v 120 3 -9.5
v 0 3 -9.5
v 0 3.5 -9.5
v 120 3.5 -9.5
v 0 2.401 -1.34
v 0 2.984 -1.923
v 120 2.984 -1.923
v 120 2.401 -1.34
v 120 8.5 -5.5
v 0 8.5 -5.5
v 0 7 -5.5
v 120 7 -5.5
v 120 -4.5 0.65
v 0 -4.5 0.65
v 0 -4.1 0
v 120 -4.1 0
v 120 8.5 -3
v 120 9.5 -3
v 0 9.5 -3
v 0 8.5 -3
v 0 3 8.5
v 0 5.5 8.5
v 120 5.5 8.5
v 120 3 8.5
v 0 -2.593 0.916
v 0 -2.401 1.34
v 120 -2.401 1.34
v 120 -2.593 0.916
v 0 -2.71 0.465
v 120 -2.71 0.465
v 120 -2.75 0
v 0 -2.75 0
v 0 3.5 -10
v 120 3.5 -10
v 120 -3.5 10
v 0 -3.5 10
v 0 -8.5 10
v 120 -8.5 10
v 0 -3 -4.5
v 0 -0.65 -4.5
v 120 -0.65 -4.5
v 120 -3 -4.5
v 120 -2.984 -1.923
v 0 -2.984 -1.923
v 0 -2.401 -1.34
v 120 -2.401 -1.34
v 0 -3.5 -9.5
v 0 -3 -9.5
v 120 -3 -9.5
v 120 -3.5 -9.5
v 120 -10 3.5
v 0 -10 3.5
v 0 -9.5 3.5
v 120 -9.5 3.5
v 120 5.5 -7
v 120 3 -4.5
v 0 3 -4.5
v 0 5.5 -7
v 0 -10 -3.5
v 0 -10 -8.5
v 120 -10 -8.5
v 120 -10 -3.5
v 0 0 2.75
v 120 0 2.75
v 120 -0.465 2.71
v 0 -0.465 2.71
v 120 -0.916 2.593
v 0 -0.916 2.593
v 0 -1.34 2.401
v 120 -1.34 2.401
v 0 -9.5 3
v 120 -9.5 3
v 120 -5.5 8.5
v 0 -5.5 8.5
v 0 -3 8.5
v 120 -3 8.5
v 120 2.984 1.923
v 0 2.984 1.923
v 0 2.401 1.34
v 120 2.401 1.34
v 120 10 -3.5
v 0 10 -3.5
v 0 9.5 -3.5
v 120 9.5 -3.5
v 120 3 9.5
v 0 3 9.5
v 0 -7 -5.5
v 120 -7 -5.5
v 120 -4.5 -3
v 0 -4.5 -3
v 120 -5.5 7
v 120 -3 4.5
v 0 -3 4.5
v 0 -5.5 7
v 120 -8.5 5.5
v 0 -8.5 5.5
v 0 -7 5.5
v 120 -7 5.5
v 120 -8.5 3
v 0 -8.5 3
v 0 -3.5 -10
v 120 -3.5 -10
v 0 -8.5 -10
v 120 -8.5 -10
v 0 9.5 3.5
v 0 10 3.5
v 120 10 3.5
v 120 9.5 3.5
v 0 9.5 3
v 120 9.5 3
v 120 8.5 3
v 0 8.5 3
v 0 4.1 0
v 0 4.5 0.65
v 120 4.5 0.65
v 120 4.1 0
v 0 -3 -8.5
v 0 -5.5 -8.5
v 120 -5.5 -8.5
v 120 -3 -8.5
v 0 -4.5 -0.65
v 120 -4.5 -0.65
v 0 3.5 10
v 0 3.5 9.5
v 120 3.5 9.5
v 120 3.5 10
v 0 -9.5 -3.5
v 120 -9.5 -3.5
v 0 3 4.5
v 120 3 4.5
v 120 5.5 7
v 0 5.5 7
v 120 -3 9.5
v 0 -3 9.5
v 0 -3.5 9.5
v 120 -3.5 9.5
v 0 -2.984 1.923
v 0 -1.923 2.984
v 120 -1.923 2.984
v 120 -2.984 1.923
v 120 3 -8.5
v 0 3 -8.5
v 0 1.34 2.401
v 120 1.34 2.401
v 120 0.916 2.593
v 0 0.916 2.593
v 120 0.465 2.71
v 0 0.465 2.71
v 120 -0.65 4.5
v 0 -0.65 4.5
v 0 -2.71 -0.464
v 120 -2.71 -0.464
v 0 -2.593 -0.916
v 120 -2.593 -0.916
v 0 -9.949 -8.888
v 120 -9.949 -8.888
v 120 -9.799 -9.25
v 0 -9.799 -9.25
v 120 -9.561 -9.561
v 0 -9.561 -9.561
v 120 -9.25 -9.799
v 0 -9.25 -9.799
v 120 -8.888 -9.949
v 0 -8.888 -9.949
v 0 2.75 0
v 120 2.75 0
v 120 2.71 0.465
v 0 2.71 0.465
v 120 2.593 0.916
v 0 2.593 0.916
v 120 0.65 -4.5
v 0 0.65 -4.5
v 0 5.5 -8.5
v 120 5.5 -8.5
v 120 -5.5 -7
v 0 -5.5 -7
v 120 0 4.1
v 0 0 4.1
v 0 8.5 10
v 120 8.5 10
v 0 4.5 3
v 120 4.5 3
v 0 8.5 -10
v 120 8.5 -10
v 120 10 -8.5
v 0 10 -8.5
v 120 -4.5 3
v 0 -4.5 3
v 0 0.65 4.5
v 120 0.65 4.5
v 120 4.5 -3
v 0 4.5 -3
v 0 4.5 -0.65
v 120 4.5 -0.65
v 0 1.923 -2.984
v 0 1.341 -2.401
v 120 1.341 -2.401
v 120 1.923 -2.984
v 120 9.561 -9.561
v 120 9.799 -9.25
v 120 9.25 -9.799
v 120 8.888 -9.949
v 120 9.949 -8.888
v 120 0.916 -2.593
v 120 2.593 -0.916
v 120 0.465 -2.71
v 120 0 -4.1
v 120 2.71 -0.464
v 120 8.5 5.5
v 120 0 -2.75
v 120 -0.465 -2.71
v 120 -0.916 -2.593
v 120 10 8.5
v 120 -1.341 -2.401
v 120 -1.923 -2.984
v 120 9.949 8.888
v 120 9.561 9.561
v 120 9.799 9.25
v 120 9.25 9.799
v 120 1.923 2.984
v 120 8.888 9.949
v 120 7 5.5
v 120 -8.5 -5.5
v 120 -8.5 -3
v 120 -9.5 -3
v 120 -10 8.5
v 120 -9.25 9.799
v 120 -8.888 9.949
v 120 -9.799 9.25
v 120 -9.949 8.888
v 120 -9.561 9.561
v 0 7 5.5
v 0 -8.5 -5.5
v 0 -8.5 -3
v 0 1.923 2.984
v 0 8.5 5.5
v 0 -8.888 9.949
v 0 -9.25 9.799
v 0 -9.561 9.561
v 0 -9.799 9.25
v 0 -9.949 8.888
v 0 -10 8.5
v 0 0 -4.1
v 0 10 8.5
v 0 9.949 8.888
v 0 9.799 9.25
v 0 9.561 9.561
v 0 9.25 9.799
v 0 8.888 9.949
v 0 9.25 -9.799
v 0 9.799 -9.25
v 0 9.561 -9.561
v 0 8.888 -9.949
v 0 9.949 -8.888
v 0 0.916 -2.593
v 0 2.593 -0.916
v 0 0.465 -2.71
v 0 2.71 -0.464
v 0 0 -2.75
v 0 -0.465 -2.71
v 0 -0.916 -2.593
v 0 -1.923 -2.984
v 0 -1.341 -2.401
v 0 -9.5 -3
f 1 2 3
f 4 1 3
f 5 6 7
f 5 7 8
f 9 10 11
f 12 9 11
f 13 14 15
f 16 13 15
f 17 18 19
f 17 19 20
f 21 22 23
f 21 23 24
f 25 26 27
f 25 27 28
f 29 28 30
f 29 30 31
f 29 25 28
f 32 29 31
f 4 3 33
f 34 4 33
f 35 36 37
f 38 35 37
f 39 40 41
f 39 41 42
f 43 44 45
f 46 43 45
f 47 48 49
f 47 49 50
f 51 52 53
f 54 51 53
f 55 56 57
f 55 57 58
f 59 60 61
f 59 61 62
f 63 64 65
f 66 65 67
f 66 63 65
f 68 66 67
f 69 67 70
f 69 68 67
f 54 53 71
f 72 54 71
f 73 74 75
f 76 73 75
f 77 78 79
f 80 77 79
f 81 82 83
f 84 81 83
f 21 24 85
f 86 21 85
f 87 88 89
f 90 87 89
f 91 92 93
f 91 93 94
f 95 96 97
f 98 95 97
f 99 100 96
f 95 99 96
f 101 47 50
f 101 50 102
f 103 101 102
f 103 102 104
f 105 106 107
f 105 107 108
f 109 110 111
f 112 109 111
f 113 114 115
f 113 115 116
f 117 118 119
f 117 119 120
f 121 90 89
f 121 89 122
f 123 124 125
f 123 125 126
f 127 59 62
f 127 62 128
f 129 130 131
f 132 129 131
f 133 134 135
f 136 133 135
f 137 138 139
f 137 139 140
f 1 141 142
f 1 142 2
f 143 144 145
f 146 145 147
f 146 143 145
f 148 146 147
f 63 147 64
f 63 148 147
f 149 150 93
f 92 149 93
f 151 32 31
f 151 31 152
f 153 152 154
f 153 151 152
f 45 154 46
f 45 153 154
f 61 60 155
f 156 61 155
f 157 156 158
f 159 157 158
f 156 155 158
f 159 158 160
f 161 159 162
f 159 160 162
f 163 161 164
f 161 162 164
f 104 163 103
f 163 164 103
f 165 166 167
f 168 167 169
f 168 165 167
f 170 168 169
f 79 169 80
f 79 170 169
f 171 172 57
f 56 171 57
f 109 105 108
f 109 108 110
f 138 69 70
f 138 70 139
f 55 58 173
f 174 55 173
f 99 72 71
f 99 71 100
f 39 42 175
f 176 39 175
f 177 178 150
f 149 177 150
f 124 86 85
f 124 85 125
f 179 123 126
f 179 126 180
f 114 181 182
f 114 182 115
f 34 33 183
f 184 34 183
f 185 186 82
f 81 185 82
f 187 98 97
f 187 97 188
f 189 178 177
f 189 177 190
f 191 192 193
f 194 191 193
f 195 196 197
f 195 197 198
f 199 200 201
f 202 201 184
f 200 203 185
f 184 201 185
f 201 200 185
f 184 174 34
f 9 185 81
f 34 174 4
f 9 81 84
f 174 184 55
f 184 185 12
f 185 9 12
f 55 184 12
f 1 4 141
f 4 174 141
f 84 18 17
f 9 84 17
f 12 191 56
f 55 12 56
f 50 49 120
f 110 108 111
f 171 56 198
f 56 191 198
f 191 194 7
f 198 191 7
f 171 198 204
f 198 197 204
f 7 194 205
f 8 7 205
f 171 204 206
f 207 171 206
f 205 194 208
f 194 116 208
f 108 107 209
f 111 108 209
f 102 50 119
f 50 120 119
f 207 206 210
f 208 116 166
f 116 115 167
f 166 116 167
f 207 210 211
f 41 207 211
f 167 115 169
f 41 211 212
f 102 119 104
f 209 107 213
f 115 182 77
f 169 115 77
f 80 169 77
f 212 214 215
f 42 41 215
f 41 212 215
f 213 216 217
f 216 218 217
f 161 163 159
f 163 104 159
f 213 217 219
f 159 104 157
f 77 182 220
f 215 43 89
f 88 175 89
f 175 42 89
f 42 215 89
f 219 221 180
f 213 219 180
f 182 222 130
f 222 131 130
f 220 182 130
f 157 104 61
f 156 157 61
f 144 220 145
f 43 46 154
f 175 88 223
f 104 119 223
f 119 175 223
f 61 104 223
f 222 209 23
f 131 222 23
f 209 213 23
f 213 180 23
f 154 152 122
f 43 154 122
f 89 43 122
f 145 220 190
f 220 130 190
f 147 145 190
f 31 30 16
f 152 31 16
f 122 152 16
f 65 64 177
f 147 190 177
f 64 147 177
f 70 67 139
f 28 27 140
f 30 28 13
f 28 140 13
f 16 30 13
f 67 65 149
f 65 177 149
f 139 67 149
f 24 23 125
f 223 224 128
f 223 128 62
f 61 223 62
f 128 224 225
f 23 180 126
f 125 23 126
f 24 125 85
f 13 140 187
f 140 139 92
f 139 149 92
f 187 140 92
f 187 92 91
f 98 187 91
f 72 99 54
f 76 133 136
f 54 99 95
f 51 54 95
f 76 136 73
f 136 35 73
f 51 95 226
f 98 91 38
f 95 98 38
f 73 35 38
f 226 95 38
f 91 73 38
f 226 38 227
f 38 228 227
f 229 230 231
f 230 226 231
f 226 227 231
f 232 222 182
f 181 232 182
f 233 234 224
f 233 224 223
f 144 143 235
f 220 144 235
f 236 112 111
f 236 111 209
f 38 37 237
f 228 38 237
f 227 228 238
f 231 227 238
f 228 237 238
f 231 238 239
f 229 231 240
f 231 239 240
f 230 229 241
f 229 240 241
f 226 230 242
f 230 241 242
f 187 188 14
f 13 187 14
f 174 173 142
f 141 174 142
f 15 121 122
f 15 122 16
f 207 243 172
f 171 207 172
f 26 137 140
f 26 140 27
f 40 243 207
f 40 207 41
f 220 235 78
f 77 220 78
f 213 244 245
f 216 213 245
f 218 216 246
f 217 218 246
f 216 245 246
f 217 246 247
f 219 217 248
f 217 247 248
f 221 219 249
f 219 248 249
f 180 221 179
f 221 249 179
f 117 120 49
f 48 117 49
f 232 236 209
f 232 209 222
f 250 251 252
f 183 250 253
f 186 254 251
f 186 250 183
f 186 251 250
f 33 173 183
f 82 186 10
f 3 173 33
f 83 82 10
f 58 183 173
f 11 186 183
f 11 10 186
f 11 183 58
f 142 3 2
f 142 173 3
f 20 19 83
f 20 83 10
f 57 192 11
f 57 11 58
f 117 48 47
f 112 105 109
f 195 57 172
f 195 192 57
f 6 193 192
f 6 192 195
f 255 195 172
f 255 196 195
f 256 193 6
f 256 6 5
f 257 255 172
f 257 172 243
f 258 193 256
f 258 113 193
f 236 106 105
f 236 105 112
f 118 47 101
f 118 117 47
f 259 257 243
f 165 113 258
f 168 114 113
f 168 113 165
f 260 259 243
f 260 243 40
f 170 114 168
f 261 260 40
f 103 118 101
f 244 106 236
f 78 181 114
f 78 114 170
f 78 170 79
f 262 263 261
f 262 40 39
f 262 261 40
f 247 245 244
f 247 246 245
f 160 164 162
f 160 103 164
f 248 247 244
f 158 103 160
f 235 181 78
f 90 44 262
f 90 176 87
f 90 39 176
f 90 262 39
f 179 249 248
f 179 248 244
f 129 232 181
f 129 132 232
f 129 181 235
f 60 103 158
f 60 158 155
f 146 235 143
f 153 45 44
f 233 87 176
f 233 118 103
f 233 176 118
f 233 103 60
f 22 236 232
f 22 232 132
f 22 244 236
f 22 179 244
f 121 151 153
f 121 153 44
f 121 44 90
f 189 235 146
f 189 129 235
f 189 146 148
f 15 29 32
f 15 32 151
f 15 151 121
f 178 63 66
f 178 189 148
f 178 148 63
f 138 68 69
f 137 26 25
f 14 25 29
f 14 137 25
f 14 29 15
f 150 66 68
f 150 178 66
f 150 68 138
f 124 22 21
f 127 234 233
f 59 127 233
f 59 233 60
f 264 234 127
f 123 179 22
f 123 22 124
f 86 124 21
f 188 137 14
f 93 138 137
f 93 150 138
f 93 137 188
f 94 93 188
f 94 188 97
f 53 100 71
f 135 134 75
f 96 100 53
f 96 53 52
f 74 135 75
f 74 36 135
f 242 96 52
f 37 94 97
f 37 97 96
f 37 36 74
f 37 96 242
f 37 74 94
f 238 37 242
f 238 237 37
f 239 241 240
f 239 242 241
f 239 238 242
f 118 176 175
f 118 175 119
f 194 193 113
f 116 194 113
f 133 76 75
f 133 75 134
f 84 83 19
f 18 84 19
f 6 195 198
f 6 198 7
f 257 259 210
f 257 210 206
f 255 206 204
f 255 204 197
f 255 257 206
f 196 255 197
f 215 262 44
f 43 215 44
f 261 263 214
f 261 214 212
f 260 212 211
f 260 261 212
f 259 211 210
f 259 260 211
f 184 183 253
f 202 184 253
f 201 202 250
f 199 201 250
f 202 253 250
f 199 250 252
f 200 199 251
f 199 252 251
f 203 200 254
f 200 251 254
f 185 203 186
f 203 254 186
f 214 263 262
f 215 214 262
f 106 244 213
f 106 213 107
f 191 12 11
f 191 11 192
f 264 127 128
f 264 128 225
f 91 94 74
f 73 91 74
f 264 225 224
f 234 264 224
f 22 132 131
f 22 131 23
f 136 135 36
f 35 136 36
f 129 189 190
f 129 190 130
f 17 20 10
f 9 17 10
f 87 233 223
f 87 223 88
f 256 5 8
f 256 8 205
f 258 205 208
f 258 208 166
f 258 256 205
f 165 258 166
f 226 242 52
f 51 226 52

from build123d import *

# Parameters (mm, degrees)
PAD_DEPTH = 120


with BuildPart() as part:
    # Sketch → Pad (new body)
    with BuildSketch(Plane.YZ):
        with BuildLine():
            Line((0, 4.1), (0.65, 4.5))
            Line((0.65, 4.5), (3, 4.5))
            Line((3, 4.5), (5.5, 7))
            Line((5.5, 7), (5.5, 8.5))
            Line((5.5, 8.5), (3, 8.5))
            Line((3, 8.5), (3, 9.5))
            Line((3, 9.5), (3.5, 9.5))
            Line((3.5, 9.5), (3.5, 10))
            Line((3.5, 10), (8.5, 10))
            ThreePointArc((10, 8.5), (9.56066, 9.56066), (8.5, 10))
            Line((10, 8.5), (10, 3.5))
            Line((10, 3.5), (9.5, 3.5))
            Line((9.5, 3.5), (9.5, 3))
            Line((9.5, 3), (8.5, 3))
            Line((8.5, 3), (8.5, 5.5))
            Line((8.5, 5.5), (7, 5.5))
            Line((7, 5.5), (4.5, 3))
            Line((4.5, 3), (4.5, 0.65))
            Line((4.5, 0.65), (4.1, 0))
            Line((4.5, -0.65), (4.1, 0))
            Line((4.5, -3), (4.5, -0.65))
            Line((7, -5.5), (4.5, -3))
            Line((8.5, -5.5), (7, -5.5))
            Line((8.5, -3), (8.5, -5.5))
            Line((9.5, -3), (8.5, -3))
            Line((9.5, -3.5), (9.5, -3))
            Line((10, -3.5), (9.5, -3.5))
            Line((10, -8.5), (10, -3.5))
            ThreePointArc((8.5, -10), (9.56066, -9.56066), (10, -8.5))
            Line((3.5, -10), (8.5, -10))
            Line((3.5, -9.5), (3.5, -10))
            Line((3, -9.5), (3.5, -9.5))
            Line((3, -8.5), (3, -9.5))
            Line((5.5, -8.5), (3, -8.5))
            Line((5.5, -7), (5.5, -8.5))
            Line((3, -4.5), (5.5, -7))
            Line((0.65, -4.5), (3, -4.5))
            Line((0, -4.1), (0.65, -4.5))
            Line((0, -4.1), (-0.65, -4.5))
            Line((-0.65, -4.5), (-3, -4.5))
            Line((-3, -4.5), (-5.5, -7))
            Line((-5.5, -7), (-5.5, -8.5))
            Line((-5.5, -8.5), (-3, -8.5))
            Line((-3, -8.5), (-3, -9.5))
            Line((-3, -9.5), (-3.5, -9.5))
            Line((-3.5, -9.5), (-3.5, -10))
            Line((-3.5, -10), (-8.5, -10))
            ThreePointArc((-10, -8.5), (-9.56066, -9.56066), (-8.5, -10))
            Line((-10, -8.5), (-10, -3.5))
            Line((-10, -3.5), (-9.5, -3.5))
            Line((-9.5, -3.5), (-9.5, -3))
            Line((-9.5, -3), (-8.5, -3))
            Line((-8.5, -3), (-8.5, -5.5))
            Line((-8.5, -5.5), (-7, -5.5))
            Line((-7, -5.5), (-4.5, -3))
            Line((-4.5, -3), (-4.5, -0.65))
            Line((-4.5, -0.65), (-4.1, 0))
            Line((-4.5, 0.65), (-4.1, 0))
            Line((-4.5, 3), (-4.5, 0.65))
            Line((-7, 5.5), (-4.5, 3))
            Line((-8.5, 5.5), (-7, 5.5))
            Line((-8.5, 3), (-8.5, 5.5))
            Line((-9.5, 3), (-8.5, 3))
            Line((-9.5, 3.5), (-9.5, 3))
            Line((-10, 3.5), (-9.5, 3.5))
            Line((-10, 8.5), (-10, 3.5))
            ThreePointArc((-8.5, 10), (-9.56066, 9.56066), (-10, 8.5))
            Line((-3.5, 10), (-8.5, 10))
            Line((-3.5, 9.5), (-3.5, 10))
            Line((-3, 9.5), (-3.5, 9.5))
            Line((-3, 8.5), (-3, 9.5))
            Line((-5.5, 8.5), (-3, 8.5))
            Line((-5.5, 7), (-5.5, 8.5))
            Line((-3, 4.5), (-5.5, 7))
            Line((-0.65, 4.5), (-3, 4.5))
            Line((0, 4.1), (-0.65, 4.5))
        make_face()
        with BuildLine():
            Line((1.340499, 2.401159), (1.923239, 2.983899))
            Line((1.923239, 2.983899), (2.983899, 1.923239))
            Line((2.983899, 1.923239), (2.401159, 1.340499))
            ThreePointArc((2.75, 0), (2.661361, 0.692573), (2.401159, 1.340499))
            ThreePointArc((2.401164, -1.34049), (2.661362, -0.692568), (2.75, 0))
            Line((2.983904, -1.92323), (2.401164, -1.34049))
            Line((1.923247, -2.983894), (2.983904, -1.92323))
            Line((1.340507, -2.401154), (1.923247, -2.983894))
            ThreePointArc((0, -2.75), (0.692577, -2.66136), (1.340507, -2.401154))
            ThreePointArc((-1.340507, -2.401154), (-0.692577, -2.66136), (0, -2.75))
            Line((-1.340507, -2.401154), (-1.923247, -2.983894))
            Line((-1.923247, -2.983894), (-2.983904, -1.92323))
            Line((-2.983904, -1.92323), (-2.401164, -1.34049))
            ThreePointArc((-2.75, 0), (-2.661362, -0.692568), (-2.401164, -1.34049))
            ThreePointArc((-2.401159, 1.340499), (-2.661361, 0.692572), (-2.75, 0))
            Line((-2.983899, 1.923239), (-2.401159, 1.340499))
            Line((-1.923239, 2.983899), (-2.983899, 1.923239))
            Line((-1.340499, 2.401159), (-1.923239, 2.983899))
            ThreePointArc((0, 2.75), (-0.692573, 2.661361), (-1.340499, 2.401159))
            ThreePointArc((1.340499, 2.401159), (0.692573, 2.661361), (0, 2.75))
        make_face(mode=Mode.SUBTRACT)
    extrude(amount=PAD_DEPTH)


solid = part.part
